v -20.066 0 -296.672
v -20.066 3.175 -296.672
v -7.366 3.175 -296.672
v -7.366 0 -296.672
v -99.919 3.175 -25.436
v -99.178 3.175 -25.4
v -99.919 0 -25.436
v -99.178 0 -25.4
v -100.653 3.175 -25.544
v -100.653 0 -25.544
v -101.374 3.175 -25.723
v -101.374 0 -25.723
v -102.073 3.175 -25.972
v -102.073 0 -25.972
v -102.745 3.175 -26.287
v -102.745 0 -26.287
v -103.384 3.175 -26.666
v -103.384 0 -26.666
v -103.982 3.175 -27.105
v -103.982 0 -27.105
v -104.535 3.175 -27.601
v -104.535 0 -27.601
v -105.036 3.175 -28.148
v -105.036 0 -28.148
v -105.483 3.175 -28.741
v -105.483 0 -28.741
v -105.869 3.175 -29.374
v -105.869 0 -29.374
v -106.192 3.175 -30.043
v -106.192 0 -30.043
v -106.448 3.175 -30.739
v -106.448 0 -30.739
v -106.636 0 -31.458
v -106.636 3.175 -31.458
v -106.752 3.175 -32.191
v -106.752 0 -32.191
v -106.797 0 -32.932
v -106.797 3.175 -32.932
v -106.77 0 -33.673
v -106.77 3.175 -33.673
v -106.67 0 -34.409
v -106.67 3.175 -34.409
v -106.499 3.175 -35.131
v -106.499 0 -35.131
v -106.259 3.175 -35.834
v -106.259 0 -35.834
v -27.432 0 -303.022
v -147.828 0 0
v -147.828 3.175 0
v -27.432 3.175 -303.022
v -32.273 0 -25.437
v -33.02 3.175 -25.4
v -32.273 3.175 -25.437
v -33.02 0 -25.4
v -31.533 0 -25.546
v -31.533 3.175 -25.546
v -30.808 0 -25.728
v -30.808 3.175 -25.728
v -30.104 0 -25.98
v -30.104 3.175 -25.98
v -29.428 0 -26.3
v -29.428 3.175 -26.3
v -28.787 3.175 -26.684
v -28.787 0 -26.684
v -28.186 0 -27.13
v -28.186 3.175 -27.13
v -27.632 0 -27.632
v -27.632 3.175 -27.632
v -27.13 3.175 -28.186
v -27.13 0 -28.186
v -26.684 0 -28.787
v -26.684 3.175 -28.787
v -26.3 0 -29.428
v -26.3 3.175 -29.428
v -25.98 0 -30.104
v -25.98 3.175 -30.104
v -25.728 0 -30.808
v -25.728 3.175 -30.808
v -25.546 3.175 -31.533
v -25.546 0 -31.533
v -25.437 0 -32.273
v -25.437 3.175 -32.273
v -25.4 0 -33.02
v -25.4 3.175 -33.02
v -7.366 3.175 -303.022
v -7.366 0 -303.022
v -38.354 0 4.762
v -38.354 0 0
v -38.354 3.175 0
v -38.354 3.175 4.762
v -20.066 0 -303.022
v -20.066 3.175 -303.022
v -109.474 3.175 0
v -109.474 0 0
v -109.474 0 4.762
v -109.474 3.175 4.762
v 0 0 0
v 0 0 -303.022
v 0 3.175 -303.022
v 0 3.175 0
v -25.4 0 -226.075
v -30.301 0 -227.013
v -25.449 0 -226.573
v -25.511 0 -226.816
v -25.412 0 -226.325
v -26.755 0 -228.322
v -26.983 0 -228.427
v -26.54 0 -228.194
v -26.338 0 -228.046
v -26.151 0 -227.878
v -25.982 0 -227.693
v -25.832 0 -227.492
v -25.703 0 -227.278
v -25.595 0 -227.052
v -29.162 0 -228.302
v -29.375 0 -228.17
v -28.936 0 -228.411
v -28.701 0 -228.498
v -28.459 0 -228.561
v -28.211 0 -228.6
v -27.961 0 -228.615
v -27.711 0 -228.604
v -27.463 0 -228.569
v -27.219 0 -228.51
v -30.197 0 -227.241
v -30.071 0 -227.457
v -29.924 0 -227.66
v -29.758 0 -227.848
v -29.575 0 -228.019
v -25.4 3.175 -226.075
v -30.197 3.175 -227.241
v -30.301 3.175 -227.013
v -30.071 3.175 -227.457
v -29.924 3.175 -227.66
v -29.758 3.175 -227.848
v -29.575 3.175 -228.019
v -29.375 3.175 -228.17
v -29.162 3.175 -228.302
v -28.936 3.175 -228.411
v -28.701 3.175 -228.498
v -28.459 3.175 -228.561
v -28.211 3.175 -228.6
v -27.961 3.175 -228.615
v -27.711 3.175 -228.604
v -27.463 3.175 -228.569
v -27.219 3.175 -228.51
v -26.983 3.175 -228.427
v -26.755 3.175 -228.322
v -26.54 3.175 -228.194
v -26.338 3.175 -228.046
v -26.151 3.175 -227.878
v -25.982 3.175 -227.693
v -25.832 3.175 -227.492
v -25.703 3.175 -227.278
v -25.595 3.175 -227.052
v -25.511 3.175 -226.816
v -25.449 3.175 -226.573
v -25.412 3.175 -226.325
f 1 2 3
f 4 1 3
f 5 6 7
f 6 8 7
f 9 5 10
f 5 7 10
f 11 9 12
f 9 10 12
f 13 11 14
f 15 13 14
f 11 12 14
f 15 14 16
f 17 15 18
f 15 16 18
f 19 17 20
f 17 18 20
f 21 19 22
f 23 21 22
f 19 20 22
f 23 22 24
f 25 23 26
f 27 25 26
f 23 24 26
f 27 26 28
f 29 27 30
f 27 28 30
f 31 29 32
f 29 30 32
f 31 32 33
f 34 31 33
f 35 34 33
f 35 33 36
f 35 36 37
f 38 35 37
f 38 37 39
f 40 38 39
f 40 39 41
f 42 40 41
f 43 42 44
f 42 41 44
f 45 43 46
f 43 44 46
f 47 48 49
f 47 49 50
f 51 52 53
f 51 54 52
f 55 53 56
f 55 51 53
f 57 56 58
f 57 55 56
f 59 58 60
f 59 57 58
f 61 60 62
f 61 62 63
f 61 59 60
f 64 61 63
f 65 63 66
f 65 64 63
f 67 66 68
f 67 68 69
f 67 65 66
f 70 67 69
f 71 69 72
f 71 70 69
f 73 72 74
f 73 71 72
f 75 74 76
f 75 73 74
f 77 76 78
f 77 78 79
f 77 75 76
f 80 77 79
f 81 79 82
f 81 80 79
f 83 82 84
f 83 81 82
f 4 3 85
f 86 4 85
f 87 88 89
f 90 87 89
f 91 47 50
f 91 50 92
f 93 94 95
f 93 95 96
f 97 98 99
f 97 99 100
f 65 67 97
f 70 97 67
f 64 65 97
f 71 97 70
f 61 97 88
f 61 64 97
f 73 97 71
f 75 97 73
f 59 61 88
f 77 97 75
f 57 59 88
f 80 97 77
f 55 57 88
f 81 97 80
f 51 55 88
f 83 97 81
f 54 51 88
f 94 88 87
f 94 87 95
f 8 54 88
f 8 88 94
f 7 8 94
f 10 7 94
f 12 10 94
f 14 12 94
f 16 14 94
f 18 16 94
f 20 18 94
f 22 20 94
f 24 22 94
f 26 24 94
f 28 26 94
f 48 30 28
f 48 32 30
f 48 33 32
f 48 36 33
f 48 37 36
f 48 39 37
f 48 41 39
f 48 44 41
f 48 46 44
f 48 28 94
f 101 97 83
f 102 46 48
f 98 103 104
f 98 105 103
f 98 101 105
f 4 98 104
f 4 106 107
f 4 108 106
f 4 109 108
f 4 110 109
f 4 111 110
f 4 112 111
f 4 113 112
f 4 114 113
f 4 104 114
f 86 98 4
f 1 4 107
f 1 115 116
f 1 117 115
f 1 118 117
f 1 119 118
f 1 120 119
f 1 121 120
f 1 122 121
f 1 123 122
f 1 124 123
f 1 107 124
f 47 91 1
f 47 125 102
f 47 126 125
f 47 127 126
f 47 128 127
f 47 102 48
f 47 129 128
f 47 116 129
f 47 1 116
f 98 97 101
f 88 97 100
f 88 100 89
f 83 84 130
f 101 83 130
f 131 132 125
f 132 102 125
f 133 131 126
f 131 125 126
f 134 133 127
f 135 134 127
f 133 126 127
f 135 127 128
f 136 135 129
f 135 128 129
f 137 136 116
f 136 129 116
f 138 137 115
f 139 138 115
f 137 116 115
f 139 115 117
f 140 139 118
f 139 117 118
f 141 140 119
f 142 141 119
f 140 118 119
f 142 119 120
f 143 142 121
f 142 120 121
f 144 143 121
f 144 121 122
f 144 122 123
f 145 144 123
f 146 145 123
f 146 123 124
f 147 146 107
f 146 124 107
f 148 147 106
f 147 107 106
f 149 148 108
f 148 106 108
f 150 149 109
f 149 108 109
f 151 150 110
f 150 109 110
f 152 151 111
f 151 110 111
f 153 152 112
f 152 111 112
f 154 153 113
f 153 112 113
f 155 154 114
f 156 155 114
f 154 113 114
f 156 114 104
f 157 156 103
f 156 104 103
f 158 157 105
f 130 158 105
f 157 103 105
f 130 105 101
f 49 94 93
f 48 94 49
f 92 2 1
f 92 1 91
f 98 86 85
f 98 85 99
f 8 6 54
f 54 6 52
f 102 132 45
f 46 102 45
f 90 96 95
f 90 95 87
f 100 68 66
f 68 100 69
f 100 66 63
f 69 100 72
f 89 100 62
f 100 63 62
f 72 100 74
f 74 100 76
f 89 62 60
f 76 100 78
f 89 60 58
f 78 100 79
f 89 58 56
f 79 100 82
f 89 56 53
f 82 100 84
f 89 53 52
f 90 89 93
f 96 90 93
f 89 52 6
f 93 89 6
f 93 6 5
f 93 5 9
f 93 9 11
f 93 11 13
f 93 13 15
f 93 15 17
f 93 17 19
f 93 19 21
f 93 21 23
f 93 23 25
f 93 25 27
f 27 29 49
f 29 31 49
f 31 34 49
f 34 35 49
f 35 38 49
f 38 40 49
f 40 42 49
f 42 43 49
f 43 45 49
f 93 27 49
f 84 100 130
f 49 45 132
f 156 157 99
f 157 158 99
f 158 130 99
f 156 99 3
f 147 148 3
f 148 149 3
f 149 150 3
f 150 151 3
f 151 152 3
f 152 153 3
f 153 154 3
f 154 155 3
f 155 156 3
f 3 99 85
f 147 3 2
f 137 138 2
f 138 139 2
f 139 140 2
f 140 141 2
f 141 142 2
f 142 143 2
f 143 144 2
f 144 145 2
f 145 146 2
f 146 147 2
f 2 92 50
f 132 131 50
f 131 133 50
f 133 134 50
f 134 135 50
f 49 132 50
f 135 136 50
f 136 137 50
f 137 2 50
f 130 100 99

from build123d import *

# Parameters (mm, degrees)
BOSS_EXTRUDE1_DEPTH = 3.175
SKETCH2_W           = 12.7
SKETCH2_H           = 6.35
CUT_EXTRUDE1_DEPTH  = 3.175
FILLET1_R           = 7.62
FILLET2_R           = 2.54
SKETCH3_W           = 71.12
SKETCH3_H           = 3.175
BOSS_EXTRUDE2_DEPTH = 4.7625


with BuildPart() as part:
    # Sketch1 → Boss-Extrude1 (new body)
    with BuildSketch(Plane(origin=(0, 0, 0), x_dir=(1, 0, 0), z_dir=(0, 1, 0))):
        Polygon((0, 0), (-147.828, 0), (-27.432, 303.022), (0, 303.022), align=None)
    extrude(amount=BOSS_EXTRUDE1_DEPTH)

    # Sketch2 → Cut-Extrude1 (cut)
    with BuildSketch(Plane(origin=(0, 3.175, 0), x_dir=(1, 0, 0), z_dir=(0, 1, 0))):
        with Locations((-13.716, 299.847)):
            Rectangle(SKETCH2_W, SKETCH2_H)
        Polygon((-25.4, 25.4), (-25.4, 239.346487548), (-110.404723468, 25.4), align=None)
    extrude(amount=-CUT_EXTRUDE1_DEPTH, mode=Mode.SUBTRACT)

    # Fillet1
    fillet1_edges = [part.edges().sort_by_distance(p)[0] for p in [
        (-25.4, 1.5875, -25.4),
        (-110.404723468, 1.5875, -25.4),
    ]]
    fillet(fillet1_edges, radius=FILLET1_R)

    # Fillet2
    fillet2_edges = [part.edges().sort_by_distance(p)[0] for p in [
        (-25.4, 1.5875, -239.346487548),
    ]]
    fillet(fillet2_edges, radius=FILLET2_R)

    # Sketch3 → Boss-Extrude2 (add)
    with BuildSketch(Plane.XY):
        with Locations((-73.914, 1.5875)):
            Rectangle(SKETCH3_W, SKETCH3_H)
    extrude(amount=BOSS_EXTRUDE2_DEPTH)


solid = part.part
